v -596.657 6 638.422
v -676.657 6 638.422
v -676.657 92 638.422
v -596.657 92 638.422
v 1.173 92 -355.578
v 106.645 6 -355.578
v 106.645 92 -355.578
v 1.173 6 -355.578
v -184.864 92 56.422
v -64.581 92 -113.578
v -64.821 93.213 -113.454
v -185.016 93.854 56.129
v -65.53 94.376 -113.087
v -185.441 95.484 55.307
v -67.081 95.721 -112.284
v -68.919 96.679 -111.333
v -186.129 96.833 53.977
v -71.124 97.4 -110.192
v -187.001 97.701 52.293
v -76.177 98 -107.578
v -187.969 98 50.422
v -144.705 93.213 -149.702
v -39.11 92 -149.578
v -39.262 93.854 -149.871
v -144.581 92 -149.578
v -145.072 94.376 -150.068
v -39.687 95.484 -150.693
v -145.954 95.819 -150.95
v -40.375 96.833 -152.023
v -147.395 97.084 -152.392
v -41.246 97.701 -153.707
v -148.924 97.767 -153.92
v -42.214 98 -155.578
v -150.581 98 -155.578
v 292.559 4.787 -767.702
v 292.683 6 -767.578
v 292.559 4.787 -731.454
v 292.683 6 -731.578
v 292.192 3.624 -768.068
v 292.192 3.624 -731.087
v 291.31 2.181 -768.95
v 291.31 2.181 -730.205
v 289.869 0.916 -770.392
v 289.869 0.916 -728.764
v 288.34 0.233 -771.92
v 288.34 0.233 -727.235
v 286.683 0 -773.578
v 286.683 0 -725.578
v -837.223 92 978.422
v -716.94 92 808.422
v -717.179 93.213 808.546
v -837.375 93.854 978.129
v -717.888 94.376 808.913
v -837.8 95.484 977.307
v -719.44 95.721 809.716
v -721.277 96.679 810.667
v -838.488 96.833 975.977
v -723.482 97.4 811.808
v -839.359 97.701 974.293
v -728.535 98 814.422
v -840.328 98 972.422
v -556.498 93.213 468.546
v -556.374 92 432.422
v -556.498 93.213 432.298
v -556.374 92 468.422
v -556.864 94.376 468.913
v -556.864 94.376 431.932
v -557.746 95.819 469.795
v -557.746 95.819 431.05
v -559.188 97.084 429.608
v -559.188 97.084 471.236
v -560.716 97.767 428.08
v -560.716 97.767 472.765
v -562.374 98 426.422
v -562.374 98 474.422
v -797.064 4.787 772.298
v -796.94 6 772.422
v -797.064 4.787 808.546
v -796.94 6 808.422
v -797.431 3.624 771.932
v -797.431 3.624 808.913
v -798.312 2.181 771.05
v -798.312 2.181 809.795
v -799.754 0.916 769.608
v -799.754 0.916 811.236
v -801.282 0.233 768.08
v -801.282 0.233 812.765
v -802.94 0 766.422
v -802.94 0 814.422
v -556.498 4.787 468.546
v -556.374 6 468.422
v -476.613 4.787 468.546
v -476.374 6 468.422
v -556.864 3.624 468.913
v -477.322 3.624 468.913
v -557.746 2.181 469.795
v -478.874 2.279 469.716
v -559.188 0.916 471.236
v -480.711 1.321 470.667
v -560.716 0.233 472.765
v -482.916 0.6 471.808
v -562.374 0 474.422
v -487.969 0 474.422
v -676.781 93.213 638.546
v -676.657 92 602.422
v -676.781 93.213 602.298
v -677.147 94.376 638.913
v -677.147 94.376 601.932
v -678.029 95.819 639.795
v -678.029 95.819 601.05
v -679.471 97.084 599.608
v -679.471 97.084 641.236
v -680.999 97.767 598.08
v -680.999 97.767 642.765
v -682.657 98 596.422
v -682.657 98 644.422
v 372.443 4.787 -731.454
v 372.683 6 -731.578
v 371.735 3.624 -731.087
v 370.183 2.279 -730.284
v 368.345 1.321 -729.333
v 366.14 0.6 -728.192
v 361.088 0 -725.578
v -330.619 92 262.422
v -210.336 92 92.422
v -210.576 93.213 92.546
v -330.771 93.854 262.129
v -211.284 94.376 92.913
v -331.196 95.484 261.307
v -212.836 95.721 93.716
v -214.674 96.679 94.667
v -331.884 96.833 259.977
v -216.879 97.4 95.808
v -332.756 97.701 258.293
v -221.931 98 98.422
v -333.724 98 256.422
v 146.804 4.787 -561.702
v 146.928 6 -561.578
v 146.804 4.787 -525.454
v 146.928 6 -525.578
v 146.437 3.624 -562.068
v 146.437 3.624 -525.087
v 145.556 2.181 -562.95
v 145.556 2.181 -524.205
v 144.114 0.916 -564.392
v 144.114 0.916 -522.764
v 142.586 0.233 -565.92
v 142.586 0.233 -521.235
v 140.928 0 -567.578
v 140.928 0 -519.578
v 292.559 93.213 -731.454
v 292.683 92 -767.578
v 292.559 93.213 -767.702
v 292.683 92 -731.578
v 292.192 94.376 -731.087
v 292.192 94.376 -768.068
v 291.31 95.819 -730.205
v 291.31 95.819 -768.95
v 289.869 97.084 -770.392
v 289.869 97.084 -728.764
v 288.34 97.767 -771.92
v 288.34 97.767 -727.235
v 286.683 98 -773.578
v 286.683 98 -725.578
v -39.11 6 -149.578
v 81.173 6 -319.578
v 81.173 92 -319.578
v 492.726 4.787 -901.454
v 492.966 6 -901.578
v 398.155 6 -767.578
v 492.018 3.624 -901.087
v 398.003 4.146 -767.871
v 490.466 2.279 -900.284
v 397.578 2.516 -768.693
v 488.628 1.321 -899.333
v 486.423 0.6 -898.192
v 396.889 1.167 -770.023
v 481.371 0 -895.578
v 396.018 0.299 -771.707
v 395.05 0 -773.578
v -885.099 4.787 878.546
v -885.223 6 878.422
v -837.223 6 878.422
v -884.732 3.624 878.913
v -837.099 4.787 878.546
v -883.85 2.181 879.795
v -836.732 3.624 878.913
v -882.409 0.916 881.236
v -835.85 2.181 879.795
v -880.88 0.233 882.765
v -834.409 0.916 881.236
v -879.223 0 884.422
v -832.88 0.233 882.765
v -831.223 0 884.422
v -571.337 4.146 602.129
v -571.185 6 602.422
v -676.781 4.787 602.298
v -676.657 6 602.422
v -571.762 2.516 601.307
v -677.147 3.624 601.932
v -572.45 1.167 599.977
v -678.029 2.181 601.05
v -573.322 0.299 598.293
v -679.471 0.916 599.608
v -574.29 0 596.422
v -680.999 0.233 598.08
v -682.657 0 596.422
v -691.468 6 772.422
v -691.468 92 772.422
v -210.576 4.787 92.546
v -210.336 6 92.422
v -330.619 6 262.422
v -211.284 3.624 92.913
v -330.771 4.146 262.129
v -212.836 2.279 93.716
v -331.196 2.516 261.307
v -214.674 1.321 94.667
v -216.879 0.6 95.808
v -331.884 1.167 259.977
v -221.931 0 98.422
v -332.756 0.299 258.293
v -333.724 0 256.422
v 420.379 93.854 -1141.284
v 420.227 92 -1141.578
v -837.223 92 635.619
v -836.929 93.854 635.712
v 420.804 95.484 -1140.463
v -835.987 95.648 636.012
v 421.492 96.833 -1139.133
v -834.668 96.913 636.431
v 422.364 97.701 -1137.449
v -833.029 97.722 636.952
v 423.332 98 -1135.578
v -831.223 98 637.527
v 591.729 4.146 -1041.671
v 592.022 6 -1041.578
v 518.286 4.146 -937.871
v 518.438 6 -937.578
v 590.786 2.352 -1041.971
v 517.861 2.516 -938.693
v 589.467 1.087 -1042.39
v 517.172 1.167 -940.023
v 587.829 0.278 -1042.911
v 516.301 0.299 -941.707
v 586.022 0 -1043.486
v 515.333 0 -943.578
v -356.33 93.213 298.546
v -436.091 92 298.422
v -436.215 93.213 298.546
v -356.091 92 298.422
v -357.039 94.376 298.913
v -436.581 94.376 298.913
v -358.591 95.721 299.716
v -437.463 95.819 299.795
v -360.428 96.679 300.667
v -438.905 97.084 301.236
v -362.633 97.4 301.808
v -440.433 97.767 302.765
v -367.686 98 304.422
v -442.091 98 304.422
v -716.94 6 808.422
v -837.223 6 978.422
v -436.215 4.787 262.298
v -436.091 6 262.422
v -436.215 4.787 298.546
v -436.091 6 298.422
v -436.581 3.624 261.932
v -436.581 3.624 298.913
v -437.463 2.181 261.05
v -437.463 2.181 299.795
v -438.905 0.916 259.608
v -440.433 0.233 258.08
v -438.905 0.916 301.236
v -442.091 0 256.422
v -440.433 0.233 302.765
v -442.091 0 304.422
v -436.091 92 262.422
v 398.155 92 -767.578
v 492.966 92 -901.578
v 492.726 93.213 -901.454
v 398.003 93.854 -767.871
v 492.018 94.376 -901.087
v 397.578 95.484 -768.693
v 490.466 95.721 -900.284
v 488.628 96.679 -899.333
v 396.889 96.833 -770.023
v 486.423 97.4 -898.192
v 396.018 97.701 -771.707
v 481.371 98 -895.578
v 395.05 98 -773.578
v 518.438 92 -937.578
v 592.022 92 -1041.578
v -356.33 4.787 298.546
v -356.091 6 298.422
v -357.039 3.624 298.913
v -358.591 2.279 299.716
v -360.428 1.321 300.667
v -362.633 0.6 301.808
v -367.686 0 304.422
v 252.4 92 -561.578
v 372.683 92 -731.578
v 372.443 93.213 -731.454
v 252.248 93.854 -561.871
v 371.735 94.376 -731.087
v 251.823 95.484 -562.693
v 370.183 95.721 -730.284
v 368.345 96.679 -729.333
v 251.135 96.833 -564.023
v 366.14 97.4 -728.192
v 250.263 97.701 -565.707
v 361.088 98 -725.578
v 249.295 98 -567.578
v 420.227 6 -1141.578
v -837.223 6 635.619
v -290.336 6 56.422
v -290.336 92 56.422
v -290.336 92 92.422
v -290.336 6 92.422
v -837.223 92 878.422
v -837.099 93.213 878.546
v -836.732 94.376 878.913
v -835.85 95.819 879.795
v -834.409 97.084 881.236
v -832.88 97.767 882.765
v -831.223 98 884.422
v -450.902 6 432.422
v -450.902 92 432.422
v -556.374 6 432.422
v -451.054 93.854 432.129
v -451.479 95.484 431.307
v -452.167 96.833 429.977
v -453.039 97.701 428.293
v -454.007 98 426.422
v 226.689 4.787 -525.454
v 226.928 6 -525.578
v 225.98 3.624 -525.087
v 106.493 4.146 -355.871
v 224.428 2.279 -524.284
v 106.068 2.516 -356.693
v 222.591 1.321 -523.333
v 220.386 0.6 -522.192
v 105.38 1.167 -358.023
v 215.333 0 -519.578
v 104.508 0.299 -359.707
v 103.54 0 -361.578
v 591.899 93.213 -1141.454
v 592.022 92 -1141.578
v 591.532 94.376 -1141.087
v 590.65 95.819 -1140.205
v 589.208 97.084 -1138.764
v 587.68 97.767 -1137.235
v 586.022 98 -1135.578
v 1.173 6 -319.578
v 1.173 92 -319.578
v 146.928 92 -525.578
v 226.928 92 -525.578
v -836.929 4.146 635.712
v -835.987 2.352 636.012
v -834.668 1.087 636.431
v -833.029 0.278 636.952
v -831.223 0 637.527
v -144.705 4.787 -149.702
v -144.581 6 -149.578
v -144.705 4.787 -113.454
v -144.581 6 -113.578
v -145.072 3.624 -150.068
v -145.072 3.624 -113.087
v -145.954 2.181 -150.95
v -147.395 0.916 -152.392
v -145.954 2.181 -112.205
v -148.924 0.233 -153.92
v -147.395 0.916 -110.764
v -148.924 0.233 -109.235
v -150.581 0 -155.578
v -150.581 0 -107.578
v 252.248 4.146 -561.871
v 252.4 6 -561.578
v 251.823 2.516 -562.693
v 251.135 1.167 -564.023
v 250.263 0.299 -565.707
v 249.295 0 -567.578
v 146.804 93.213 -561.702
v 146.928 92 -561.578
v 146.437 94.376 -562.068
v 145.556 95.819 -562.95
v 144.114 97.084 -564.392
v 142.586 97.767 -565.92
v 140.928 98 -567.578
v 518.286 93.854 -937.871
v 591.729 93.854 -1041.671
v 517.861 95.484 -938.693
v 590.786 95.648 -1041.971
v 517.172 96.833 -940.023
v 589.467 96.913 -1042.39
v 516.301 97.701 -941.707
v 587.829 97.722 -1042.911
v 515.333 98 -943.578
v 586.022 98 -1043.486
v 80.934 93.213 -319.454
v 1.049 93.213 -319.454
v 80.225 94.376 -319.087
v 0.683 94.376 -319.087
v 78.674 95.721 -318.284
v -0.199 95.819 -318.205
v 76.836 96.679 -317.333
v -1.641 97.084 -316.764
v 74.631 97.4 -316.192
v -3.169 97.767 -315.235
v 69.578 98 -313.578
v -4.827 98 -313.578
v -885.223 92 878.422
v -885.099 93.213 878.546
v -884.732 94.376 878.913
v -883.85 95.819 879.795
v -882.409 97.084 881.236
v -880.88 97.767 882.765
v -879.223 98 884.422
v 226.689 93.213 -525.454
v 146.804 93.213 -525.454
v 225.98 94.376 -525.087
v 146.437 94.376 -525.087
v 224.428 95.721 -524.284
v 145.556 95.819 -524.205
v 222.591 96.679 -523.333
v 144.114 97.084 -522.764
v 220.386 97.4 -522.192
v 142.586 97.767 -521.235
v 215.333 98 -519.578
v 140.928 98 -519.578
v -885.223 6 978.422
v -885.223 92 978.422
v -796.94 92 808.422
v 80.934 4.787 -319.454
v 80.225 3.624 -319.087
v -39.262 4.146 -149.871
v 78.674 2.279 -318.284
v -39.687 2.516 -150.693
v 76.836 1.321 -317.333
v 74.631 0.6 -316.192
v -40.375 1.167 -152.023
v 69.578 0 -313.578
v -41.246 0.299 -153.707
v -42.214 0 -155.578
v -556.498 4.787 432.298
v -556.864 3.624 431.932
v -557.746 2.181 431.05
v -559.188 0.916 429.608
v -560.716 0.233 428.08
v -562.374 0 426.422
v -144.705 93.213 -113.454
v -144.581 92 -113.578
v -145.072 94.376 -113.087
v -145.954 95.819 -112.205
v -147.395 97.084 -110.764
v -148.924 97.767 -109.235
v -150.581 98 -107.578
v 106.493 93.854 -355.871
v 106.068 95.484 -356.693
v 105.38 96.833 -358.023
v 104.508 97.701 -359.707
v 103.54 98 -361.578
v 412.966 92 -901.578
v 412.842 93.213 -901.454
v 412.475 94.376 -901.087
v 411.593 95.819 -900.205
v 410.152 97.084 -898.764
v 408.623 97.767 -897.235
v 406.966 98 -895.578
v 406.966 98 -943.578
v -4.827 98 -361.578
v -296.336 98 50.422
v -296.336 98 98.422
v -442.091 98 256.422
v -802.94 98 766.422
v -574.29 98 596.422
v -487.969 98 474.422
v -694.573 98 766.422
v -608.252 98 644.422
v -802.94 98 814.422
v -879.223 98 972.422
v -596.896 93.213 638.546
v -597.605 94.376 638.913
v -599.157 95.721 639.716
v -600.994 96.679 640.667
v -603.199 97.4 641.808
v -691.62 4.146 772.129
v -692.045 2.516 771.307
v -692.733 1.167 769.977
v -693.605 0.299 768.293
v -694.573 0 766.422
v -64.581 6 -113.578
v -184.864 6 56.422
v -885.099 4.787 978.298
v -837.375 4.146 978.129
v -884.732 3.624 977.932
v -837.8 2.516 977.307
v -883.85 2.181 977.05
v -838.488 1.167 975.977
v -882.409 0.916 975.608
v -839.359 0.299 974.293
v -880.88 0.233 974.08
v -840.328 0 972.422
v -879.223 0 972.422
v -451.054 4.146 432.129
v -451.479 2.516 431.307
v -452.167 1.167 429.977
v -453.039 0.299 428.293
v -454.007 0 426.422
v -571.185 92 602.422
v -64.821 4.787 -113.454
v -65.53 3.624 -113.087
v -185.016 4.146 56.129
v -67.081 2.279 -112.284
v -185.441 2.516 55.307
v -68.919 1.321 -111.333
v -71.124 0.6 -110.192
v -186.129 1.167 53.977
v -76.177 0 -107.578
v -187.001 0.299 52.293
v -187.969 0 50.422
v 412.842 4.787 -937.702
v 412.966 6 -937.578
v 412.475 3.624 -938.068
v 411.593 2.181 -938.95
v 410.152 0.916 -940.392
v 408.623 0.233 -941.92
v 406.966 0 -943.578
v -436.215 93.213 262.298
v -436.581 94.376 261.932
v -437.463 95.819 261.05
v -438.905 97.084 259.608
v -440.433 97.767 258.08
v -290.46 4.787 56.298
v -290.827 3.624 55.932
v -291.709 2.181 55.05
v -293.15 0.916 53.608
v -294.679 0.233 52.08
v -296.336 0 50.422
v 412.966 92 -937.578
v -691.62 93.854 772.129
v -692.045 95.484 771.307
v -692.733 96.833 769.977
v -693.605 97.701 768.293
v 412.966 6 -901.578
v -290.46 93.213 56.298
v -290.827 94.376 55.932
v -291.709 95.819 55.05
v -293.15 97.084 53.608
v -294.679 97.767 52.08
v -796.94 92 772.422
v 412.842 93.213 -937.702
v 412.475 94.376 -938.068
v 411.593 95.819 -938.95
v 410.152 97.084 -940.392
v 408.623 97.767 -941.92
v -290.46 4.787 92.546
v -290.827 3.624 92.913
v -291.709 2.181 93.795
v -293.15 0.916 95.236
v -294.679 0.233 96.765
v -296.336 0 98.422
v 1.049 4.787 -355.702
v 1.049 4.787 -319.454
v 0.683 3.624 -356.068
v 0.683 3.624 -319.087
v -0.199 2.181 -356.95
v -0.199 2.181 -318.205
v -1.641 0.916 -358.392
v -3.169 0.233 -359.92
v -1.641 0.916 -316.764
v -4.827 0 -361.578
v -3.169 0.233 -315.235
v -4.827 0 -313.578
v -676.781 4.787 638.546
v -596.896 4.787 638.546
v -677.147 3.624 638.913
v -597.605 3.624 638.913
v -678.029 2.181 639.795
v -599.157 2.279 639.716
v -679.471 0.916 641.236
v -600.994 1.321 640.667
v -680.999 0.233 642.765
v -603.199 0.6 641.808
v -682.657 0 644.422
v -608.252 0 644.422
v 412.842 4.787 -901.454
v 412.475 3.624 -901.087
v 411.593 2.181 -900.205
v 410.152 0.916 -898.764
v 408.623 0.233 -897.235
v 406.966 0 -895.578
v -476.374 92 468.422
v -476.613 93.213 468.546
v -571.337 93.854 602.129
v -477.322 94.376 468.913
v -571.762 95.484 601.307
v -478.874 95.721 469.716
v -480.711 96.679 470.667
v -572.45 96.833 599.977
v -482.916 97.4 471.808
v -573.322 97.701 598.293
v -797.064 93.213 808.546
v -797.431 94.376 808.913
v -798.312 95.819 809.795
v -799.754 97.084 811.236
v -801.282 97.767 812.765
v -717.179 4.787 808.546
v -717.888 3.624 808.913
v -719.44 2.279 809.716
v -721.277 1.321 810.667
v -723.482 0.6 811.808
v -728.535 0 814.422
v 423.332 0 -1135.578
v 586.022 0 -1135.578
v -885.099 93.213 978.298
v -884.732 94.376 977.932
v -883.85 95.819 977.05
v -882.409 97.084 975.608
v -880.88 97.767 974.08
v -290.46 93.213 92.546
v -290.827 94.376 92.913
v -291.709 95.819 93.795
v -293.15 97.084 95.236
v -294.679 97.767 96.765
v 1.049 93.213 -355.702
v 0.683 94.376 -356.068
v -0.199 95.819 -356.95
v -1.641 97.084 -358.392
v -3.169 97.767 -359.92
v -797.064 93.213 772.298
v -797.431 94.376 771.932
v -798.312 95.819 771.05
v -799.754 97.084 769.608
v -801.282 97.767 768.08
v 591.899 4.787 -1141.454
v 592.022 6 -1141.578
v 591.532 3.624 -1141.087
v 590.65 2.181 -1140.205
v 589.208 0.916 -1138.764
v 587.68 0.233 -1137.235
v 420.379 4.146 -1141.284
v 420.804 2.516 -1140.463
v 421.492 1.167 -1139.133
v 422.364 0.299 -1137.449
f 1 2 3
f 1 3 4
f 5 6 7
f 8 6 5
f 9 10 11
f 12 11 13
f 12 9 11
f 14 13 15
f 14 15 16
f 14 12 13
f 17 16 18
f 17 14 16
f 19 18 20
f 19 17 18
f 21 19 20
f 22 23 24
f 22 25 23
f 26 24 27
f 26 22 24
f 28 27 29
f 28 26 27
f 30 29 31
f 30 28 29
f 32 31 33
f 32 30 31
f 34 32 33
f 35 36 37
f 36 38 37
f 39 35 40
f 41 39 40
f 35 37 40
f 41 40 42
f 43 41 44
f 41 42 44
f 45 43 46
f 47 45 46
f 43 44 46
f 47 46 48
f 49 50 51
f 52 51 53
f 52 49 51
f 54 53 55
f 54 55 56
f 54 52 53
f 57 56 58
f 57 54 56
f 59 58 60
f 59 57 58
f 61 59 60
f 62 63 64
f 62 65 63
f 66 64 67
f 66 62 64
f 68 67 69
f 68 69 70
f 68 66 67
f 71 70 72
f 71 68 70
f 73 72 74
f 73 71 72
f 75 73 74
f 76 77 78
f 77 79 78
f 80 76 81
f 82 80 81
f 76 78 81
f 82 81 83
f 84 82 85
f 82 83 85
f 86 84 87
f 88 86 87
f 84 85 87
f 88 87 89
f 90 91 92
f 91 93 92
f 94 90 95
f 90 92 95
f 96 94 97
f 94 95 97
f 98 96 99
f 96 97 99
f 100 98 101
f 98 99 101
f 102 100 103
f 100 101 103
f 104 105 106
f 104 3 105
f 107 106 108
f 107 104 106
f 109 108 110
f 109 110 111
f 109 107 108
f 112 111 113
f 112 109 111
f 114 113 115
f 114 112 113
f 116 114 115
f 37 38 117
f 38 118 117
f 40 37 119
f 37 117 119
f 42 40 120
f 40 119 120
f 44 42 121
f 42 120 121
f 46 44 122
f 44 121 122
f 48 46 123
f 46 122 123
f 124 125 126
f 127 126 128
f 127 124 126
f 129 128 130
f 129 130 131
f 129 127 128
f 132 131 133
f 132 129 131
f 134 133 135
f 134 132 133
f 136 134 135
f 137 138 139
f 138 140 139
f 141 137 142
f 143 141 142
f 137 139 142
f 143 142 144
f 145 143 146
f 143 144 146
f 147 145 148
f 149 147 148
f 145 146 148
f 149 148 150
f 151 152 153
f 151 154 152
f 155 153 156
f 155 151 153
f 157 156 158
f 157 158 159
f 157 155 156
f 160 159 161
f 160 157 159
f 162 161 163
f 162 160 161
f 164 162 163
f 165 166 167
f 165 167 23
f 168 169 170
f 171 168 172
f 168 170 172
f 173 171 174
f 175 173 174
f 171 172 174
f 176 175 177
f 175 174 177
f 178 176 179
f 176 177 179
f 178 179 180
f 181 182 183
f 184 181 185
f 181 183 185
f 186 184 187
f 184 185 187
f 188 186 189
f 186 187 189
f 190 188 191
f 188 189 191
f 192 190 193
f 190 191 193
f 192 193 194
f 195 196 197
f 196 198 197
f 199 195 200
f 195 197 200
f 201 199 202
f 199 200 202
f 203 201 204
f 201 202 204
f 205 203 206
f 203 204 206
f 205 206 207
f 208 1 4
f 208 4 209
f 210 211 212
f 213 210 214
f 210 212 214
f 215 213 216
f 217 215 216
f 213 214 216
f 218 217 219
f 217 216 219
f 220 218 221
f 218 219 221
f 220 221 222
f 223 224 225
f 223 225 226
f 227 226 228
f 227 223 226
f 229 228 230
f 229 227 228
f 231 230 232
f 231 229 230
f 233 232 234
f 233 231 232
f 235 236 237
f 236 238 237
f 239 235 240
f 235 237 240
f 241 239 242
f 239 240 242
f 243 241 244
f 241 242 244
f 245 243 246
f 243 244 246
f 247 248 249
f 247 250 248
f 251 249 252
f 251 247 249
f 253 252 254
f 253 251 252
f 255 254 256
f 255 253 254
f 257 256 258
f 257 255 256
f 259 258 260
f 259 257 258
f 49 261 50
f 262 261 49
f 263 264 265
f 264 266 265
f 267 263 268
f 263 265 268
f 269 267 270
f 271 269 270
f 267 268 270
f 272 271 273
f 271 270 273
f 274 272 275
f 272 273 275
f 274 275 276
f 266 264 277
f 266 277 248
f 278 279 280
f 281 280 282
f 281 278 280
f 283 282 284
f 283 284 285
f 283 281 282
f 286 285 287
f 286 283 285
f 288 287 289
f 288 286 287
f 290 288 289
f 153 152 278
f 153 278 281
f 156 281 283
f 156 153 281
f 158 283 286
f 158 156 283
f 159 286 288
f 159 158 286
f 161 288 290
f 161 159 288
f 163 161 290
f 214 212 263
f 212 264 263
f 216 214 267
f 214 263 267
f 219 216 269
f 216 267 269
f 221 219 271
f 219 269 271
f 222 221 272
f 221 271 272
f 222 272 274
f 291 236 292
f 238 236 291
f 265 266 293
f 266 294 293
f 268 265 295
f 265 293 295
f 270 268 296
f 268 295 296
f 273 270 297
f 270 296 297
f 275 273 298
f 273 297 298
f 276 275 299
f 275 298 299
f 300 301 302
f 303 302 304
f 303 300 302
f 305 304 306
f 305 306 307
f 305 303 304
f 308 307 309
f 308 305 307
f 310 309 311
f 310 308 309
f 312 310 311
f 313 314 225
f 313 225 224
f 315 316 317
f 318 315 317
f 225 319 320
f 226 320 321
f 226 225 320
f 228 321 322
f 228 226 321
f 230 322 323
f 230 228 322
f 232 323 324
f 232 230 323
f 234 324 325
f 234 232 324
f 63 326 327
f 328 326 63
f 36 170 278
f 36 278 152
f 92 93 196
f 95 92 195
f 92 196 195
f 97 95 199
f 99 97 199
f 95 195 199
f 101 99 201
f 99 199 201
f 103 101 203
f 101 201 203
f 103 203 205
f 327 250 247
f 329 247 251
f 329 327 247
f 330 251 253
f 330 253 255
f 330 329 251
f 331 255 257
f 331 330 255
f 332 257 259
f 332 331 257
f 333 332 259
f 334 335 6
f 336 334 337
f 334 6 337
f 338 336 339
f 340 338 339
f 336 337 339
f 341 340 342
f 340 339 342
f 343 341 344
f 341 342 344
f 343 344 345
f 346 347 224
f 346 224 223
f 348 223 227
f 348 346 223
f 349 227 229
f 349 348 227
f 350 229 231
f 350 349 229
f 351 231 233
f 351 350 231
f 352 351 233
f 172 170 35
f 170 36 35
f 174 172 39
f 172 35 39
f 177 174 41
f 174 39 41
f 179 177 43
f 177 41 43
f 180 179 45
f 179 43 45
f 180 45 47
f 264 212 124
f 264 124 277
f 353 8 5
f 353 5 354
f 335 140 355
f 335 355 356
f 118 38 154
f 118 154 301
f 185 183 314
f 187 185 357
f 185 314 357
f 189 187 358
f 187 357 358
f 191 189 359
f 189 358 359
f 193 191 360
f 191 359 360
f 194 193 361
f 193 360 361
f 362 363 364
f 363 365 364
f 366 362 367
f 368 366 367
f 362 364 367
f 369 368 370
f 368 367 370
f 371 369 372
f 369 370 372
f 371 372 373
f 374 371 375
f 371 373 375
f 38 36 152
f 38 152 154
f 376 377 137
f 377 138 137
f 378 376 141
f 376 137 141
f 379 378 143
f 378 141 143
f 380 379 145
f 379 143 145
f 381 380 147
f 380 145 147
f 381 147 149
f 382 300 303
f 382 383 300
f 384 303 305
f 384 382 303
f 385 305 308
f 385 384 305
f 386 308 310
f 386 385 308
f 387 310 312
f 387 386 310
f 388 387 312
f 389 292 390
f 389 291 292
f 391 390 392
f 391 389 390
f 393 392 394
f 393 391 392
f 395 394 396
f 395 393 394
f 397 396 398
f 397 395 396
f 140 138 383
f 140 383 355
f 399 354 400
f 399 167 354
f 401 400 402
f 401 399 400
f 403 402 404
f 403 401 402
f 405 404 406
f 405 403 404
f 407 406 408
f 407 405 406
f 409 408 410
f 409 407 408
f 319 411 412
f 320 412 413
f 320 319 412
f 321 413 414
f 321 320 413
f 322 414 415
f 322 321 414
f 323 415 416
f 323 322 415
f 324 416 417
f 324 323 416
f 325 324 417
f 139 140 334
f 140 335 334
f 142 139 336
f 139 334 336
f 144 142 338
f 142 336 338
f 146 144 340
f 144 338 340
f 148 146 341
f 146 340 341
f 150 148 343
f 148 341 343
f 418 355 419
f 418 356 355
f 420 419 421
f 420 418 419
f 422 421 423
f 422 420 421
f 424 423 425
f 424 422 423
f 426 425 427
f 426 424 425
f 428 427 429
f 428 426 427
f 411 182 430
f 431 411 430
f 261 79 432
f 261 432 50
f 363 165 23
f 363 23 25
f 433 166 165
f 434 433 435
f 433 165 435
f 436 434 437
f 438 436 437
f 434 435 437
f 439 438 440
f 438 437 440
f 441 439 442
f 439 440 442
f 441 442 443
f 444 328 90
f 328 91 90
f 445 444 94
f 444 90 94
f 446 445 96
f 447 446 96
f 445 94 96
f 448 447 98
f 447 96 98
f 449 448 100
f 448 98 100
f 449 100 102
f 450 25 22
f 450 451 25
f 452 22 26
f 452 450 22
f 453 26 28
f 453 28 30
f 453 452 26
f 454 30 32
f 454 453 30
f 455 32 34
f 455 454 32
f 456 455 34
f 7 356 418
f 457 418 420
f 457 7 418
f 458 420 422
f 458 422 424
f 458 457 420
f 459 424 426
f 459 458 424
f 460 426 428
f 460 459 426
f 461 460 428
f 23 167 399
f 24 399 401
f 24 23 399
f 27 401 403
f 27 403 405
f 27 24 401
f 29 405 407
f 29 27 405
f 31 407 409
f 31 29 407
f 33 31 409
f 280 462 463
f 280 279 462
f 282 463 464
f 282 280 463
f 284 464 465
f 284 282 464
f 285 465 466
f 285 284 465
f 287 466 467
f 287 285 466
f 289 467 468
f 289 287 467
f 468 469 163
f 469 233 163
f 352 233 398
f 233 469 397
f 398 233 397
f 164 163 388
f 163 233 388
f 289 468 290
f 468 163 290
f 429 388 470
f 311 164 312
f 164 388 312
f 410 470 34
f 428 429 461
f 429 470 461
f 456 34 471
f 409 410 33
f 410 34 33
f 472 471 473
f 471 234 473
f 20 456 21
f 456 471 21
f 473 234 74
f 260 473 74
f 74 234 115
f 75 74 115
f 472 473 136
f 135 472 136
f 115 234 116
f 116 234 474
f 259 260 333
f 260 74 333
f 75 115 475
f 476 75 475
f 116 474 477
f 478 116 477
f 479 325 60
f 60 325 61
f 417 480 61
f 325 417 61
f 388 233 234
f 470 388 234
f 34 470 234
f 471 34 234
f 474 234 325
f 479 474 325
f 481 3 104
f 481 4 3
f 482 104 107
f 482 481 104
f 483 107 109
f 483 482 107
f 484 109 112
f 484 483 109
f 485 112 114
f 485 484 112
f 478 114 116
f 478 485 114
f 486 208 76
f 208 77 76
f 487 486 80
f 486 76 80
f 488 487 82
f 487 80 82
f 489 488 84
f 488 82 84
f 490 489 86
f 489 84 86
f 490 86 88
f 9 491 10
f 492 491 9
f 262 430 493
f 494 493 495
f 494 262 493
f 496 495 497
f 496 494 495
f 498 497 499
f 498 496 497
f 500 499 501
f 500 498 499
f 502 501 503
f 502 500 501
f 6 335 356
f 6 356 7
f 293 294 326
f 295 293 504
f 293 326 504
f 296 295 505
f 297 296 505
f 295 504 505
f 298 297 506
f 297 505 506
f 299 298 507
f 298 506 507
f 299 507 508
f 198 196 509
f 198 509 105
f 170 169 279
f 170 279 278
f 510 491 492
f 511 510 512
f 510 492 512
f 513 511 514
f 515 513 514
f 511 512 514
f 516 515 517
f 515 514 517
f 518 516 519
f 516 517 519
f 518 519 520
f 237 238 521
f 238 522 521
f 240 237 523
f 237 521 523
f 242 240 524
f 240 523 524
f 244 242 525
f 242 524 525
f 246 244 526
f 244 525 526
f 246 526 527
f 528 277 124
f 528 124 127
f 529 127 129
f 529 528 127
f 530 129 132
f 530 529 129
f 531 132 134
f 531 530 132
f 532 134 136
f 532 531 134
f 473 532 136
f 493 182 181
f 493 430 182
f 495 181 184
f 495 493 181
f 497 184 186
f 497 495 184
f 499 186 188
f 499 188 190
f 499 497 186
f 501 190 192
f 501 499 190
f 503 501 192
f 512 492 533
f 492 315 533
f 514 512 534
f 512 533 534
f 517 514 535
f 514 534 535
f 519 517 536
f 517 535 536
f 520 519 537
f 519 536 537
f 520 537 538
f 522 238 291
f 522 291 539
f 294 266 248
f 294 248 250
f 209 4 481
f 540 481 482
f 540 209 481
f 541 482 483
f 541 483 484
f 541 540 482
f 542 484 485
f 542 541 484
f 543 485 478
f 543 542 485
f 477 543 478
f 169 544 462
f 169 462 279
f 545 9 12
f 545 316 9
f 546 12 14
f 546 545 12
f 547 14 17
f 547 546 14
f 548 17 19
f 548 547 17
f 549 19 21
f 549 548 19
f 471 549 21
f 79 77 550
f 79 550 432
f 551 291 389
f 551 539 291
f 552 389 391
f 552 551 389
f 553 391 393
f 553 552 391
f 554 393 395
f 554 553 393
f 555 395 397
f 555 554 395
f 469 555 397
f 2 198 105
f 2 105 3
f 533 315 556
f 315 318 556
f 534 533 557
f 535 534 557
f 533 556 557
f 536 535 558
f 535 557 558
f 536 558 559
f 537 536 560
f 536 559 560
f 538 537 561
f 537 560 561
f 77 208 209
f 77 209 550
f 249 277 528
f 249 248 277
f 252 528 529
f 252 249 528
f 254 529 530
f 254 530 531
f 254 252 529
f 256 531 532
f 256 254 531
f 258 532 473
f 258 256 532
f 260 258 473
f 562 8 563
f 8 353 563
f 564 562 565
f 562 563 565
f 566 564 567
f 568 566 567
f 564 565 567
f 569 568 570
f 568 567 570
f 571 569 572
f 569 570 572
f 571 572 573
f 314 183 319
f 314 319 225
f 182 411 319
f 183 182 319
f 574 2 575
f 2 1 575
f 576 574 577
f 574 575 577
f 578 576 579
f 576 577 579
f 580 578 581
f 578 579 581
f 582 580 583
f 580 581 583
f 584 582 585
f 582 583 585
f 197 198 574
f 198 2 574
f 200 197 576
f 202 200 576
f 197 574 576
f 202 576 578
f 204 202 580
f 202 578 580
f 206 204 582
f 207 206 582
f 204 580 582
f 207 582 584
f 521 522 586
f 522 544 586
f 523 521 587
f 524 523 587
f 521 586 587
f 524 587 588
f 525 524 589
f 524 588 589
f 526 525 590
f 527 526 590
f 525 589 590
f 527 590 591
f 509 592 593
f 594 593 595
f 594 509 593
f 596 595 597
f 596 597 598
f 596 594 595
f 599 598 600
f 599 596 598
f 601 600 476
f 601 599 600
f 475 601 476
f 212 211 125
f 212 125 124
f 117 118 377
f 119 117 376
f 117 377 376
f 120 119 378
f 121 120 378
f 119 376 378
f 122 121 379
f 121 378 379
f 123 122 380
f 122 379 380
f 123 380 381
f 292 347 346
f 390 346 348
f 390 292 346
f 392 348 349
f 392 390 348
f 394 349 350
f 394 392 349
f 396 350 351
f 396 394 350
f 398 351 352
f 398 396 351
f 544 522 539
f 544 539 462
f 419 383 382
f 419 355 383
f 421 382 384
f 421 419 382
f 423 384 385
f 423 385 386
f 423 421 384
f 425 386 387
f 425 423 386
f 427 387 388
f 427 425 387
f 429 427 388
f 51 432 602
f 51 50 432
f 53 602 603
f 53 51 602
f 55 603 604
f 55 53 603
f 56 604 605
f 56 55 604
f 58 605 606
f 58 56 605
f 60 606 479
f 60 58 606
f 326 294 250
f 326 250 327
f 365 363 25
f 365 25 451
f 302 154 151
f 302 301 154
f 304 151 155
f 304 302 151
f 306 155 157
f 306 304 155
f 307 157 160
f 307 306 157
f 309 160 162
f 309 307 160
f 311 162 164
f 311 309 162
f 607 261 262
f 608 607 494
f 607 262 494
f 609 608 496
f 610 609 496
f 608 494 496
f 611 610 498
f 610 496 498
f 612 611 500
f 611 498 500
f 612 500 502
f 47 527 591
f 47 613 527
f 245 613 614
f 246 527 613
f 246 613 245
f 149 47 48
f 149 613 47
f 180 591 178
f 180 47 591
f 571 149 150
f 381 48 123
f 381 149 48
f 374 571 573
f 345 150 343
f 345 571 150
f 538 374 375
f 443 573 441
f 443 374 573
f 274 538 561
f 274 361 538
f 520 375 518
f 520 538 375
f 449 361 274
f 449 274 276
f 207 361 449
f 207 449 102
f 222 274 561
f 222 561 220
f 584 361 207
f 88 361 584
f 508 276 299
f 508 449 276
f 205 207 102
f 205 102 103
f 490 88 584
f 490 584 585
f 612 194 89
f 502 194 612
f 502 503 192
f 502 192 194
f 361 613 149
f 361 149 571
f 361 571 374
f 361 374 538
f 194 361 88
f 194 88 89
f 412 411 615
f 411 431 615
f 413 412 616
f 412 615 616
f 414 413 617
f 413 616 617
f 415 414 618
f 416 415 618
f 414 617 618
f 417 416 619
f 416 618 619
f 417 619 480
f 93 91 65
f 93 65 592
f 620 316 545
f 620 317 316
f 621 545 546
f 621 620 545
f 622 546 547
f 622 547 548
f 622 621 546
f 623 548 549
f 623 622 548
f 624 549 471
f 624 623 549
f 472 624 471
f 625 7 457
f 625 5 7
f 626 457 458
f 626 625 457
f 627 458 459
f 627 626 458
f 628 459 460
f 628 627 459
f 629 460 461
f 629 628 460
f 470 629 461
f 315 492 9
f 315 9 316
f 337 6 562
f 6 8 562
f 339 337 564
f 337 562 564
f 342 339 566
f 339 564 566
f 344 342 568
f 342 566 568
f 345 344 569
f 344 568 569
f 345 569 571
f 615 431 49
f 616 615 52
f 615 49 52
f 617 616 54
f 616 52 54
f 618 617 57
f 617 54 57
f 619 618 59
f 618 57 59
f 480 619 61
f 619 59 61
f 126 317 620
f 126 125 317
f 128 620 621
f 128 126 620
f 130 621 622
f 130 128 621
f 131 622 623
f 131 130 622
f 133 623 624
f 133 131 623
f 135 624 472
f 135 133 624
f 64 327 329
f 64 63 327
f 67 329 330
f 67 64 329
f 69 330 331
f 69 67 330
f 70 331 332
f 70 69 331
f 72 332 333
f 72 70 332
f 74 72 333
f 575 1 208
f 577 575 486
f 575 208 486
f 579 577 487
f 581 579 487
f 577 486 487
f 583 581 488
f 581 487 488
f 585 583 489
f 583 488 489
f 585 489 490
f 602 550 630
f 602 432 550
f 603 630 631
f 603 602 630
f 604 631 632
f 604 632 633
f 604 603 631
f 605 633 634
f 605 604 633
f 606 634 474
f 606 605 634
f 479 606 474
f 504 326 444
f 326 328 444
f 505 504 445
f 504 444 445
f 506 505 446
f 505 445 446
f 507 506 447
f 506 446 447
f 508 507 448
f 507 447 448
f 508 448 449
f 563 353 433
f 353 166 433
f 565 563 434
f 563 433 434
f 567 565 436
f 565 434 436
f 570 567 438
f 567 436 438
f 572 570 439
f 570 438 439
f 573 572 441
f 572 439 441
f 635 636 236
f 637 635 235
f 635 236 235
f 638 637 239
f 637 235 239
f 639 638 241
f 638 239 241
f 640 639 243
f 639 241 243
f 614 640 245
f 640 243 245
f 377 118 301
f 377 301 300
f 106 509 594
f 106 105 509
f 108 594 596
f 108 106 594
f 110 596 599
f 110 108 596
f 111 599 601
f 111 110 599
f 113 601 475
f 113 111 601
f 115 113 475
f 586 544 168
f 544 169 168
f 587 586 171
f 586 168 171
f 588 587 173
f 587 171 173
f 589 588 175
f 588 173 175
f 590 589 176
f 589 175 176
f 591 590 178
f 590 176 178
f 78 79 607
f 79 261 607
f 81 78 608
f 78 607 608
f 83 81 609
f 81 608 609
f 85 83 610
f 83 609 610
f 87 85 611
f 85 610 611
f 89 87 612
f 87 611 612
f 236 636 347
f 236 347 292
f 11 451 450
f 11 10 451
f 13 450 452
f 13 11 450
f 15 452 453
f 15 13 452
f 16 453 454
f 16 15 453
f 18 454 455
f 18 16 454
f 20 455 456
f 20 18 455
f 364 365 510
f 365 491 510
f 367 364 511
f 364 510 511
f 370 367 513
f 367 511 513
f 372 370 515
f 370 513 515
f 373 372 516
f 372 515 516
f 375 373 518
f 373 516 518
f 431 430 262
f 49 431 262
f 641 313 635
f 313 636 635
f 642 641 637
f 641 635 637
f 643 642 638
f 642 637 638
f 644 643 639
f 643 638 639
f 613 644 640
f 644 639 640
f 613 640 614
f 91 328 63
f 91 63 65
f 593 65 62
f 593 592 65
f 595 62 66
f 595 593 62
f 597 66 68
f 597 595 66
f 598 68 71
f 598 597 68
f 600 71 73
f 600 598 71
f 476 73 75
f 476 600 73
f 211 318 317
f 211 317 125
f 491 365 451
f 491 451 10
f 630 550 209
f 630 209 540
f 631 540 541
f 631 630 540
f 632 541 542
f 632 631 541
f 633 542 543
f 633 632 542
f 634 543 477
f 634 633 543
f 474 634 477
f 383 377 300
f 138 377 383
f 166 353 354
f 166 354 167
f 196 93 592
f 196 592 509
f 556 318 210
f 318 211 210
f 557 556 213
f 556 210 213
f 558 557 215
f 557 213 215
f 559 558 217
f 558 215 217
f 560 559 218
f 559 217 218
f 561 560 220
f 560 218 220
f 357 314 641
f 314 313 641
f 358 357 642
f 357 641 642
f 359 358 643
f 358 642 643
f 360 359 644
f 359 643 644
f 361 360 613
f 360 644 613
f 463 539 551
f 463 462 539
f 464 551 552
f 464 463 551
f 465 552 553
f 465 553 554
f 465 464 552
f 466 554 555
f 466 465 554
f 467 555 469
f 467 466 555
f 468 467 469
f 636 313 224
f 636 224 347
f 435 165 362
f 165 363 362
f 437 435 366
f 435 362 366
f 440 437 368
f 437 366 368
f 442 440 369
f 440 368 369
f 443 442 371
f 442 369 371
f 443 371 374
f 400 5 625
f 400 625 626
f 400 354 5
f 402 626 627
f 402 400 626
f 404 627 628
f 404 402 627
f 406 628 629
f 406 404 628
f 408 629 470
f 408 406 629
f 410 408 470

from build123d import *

# Parameters (mm, degrees)
F0_W     = 48
F0_H     = 100
F1_DEPTH = 98
F2_R     = 6


with BuildPart() as f1:
    # F0 (on Front) → F1 (new body)
    with BuildSketch(Plane.XZ):
        Polygon((-716.939801, 808.42229), (-837.22282, 978.42229), (-837.22282, 878.42229), (-837.22282, 635.618518), (420.227342, -1141.57771), (592.022463, -1141.57771), (592.022463, -1041.57771), (518.437557, -937.57771), (412.965859, -937.57771), (412.965859, -901.57771), (492.965859, -901.57771), (398.154538, -767.57771), (292.68284, -767.57771), (292.68284, -731.57771), (372.68284, -731.57771), (252.399821, -561.57771), (146.928123, -561.57771), (146.928123, -525.57771), (226.928123, -525.57771), (106.645104, -355.57771), (1.173406, -355.57771), (1.173406, -319.57771), (81.173406, -319.57771), (-39.109613, -149.57771), (-144.581311, -149.57771), (-144.581311, -113.57771), (-64.581311, -113.57771), (-184.86433, 56.42229), (-290.336028, 56.42229), (-290.336028, 92.42229), (-210.336028, 92.42229), (-330.619047, 262.42229), (-436.090745, 262.42229), (-436.090745, 298.42229), (-356.090745, 298.42229), (-450.902065, 432.42229), (-556.373764, 432.42229), (-556.373764, 468.42229), (-476.373764, 468.42229), (-571.185084, 602.42229), (-676.656782, 602.42229), (-676.656782, 638.42229), (-596.656782, 638.42229), (-691.468103, 772.42229), (-796.939801, 772.42229), (-796.939801, 808.42229), align=None)
        with Locations((-861.22282, 928.42229)):
            Rectangle(F0_W, F0_H)
    extrude(amount=-F1_DEPTH)

    # F2
    f2_edges = [f1.edges().sort_by_distance(p)[0] for p in [
        (-208.497739, 0, -252.979596),
        (506.124902, 0, -1141.57771),
        (592.022463, 0, -1091.57771),
        (555.23001, 0, -989.57771),
        (465.701708, 0, -937.57771),
        (412.965859, 0, -919.57771),
        (452.965859, 0, -901.57771),
        (445.560199, 0, -834.57771),
        (345.418689, 0, -767.57771),
        (292.68284, 0, -749.57771),
        (332.68284, 0, -731.57771),
        (312.541331, 0, -646.57771),
        (199.663972, 0, -561.57771),
        (146.928123, 0, -543.57771),
        (186.928123, 0, -525.57771),
        (166.786614, 0, -440.57771),
        (53.909255, 0, -355.57771),
        (1.173406, 0, -337.57771),
        (41.173406, 0, -319.57771),
        (21.031897, 0, -234.57771),
        (-91.845462, 0, -149.57771),
        (-144.581311, 0, -131.57771),
        (-104.581311, 0, -113.57771),
        (-124.72282, 0, -28.57771),
        (-237.600179, 0, 56.42229),
        (-290.336028, 0, 74.42229),
        (-250.336028, 0, 92.42229),
        (-270.477537, 0, 177.42229),
        (-383.354896, 0, 262.42229),
        (-436.090745, 0, 280.42229),
        (-396.090745, 0, 298.42229),
        (-403.496405, 0, 365.42229),
        (-503.637914, 0, 432.42229),
        (-556.373764, 0, 450.42229),
        (-516.373764, 0, 468.42229),
        (-523.779424, 0, 535.42229),
        (-623.920933, 0, 602.42229),
        (-676.656782, 0, 620.42229),
        (-636.656782, 0, 638.42229),
        (-644.062443, 0, 705.42229),
        (-744.203952, 0, 772.42229),
        (-796.939801, 0, 790.42229),
        (-756.939801, 0, 808.42229),
        (-777.081311, 0, 893.42229),
        (-861.22282, 0, 978.42229),
        (-885.22282, 0, 928.42229),
        (-861.22282, 0, 878.42229),
        (-837.22282, 0, 757.020404),
        (-208.497739, 98, -252.979596),
        (506.124902, 98, -1141.57771),
        (592.022463, 98, -1091.57771),
        (555.23001, 98, -989.57771),
        (465.701708, 98, -937.57771),
        (412.965859, 98, -919.57771),
        (452.965859, 98, -901.57771),
        (445.560199, 98, -834.57771),
        (345.418689, 98, -767.57771),
        (292.68284, 98, -749.57771),
        (332.68284, 98, -731.57771),
        (312.541331, 98, -646.57771),
        (199.663972, 98, -561.57771),
        (146.928123, 98, -543.57771),
        (186.928123, 98, -525.57771),
        (166.786614, 98, -440.57771),
        (53.909255, 98, -355.57771),
        (1.173406, 98, -337.57771),
        (41.173406, 98, -319.57771),
        (21.031897, 98, -234.57771),
        (-91.845462, 98, -149.57771),
        (-144.581311, 98, -131.57771),
        (-104.581311, 98, -113.57771),
        (-124.72282, 98, -28.57771),
        (-237.600179, 98, 56.42229),
        (-290.336028, 98, 74.42229),
        (-250.336028, 98, 92.42229),
        (-270.477537, 98, 177.42229),
        (-383.354896, 98, 262.42229),
        (-436.090745, 98, 280.42229),
        (-396.090745, 98, 298.42229),
        (-403.496405, 98, 365.42229),
        (-503.637914, 98, 432.42229),
        (-556.373764, 98, 450.42229),
        (-516.373764, 98, 468.42229),
        (-523.779424, 98, 535.42229),
        (-623.920933, 98, 602.42229),
        (-676.656782, 98, 620.42229),
        (-636.656782, 98, 638.42229),
        (-644.062443, 98, 705.42229),
        (-744.203952, 98, 772.42229),
        (-796.939801, 98, 790.42229),
        (-756.939801, 98, 808.42229),
        (-777.081311, 98, 893.42229),
        (-861.22282, 98, 978.42229),
        (-885.22282, 98, 928.42229),
        (-861.22282, 98, 878.42229),
        (-837.22282, 98, 757.020404),
    ]]
    fillet(f2_edges, radius=F2_R)


solid = f1.part
